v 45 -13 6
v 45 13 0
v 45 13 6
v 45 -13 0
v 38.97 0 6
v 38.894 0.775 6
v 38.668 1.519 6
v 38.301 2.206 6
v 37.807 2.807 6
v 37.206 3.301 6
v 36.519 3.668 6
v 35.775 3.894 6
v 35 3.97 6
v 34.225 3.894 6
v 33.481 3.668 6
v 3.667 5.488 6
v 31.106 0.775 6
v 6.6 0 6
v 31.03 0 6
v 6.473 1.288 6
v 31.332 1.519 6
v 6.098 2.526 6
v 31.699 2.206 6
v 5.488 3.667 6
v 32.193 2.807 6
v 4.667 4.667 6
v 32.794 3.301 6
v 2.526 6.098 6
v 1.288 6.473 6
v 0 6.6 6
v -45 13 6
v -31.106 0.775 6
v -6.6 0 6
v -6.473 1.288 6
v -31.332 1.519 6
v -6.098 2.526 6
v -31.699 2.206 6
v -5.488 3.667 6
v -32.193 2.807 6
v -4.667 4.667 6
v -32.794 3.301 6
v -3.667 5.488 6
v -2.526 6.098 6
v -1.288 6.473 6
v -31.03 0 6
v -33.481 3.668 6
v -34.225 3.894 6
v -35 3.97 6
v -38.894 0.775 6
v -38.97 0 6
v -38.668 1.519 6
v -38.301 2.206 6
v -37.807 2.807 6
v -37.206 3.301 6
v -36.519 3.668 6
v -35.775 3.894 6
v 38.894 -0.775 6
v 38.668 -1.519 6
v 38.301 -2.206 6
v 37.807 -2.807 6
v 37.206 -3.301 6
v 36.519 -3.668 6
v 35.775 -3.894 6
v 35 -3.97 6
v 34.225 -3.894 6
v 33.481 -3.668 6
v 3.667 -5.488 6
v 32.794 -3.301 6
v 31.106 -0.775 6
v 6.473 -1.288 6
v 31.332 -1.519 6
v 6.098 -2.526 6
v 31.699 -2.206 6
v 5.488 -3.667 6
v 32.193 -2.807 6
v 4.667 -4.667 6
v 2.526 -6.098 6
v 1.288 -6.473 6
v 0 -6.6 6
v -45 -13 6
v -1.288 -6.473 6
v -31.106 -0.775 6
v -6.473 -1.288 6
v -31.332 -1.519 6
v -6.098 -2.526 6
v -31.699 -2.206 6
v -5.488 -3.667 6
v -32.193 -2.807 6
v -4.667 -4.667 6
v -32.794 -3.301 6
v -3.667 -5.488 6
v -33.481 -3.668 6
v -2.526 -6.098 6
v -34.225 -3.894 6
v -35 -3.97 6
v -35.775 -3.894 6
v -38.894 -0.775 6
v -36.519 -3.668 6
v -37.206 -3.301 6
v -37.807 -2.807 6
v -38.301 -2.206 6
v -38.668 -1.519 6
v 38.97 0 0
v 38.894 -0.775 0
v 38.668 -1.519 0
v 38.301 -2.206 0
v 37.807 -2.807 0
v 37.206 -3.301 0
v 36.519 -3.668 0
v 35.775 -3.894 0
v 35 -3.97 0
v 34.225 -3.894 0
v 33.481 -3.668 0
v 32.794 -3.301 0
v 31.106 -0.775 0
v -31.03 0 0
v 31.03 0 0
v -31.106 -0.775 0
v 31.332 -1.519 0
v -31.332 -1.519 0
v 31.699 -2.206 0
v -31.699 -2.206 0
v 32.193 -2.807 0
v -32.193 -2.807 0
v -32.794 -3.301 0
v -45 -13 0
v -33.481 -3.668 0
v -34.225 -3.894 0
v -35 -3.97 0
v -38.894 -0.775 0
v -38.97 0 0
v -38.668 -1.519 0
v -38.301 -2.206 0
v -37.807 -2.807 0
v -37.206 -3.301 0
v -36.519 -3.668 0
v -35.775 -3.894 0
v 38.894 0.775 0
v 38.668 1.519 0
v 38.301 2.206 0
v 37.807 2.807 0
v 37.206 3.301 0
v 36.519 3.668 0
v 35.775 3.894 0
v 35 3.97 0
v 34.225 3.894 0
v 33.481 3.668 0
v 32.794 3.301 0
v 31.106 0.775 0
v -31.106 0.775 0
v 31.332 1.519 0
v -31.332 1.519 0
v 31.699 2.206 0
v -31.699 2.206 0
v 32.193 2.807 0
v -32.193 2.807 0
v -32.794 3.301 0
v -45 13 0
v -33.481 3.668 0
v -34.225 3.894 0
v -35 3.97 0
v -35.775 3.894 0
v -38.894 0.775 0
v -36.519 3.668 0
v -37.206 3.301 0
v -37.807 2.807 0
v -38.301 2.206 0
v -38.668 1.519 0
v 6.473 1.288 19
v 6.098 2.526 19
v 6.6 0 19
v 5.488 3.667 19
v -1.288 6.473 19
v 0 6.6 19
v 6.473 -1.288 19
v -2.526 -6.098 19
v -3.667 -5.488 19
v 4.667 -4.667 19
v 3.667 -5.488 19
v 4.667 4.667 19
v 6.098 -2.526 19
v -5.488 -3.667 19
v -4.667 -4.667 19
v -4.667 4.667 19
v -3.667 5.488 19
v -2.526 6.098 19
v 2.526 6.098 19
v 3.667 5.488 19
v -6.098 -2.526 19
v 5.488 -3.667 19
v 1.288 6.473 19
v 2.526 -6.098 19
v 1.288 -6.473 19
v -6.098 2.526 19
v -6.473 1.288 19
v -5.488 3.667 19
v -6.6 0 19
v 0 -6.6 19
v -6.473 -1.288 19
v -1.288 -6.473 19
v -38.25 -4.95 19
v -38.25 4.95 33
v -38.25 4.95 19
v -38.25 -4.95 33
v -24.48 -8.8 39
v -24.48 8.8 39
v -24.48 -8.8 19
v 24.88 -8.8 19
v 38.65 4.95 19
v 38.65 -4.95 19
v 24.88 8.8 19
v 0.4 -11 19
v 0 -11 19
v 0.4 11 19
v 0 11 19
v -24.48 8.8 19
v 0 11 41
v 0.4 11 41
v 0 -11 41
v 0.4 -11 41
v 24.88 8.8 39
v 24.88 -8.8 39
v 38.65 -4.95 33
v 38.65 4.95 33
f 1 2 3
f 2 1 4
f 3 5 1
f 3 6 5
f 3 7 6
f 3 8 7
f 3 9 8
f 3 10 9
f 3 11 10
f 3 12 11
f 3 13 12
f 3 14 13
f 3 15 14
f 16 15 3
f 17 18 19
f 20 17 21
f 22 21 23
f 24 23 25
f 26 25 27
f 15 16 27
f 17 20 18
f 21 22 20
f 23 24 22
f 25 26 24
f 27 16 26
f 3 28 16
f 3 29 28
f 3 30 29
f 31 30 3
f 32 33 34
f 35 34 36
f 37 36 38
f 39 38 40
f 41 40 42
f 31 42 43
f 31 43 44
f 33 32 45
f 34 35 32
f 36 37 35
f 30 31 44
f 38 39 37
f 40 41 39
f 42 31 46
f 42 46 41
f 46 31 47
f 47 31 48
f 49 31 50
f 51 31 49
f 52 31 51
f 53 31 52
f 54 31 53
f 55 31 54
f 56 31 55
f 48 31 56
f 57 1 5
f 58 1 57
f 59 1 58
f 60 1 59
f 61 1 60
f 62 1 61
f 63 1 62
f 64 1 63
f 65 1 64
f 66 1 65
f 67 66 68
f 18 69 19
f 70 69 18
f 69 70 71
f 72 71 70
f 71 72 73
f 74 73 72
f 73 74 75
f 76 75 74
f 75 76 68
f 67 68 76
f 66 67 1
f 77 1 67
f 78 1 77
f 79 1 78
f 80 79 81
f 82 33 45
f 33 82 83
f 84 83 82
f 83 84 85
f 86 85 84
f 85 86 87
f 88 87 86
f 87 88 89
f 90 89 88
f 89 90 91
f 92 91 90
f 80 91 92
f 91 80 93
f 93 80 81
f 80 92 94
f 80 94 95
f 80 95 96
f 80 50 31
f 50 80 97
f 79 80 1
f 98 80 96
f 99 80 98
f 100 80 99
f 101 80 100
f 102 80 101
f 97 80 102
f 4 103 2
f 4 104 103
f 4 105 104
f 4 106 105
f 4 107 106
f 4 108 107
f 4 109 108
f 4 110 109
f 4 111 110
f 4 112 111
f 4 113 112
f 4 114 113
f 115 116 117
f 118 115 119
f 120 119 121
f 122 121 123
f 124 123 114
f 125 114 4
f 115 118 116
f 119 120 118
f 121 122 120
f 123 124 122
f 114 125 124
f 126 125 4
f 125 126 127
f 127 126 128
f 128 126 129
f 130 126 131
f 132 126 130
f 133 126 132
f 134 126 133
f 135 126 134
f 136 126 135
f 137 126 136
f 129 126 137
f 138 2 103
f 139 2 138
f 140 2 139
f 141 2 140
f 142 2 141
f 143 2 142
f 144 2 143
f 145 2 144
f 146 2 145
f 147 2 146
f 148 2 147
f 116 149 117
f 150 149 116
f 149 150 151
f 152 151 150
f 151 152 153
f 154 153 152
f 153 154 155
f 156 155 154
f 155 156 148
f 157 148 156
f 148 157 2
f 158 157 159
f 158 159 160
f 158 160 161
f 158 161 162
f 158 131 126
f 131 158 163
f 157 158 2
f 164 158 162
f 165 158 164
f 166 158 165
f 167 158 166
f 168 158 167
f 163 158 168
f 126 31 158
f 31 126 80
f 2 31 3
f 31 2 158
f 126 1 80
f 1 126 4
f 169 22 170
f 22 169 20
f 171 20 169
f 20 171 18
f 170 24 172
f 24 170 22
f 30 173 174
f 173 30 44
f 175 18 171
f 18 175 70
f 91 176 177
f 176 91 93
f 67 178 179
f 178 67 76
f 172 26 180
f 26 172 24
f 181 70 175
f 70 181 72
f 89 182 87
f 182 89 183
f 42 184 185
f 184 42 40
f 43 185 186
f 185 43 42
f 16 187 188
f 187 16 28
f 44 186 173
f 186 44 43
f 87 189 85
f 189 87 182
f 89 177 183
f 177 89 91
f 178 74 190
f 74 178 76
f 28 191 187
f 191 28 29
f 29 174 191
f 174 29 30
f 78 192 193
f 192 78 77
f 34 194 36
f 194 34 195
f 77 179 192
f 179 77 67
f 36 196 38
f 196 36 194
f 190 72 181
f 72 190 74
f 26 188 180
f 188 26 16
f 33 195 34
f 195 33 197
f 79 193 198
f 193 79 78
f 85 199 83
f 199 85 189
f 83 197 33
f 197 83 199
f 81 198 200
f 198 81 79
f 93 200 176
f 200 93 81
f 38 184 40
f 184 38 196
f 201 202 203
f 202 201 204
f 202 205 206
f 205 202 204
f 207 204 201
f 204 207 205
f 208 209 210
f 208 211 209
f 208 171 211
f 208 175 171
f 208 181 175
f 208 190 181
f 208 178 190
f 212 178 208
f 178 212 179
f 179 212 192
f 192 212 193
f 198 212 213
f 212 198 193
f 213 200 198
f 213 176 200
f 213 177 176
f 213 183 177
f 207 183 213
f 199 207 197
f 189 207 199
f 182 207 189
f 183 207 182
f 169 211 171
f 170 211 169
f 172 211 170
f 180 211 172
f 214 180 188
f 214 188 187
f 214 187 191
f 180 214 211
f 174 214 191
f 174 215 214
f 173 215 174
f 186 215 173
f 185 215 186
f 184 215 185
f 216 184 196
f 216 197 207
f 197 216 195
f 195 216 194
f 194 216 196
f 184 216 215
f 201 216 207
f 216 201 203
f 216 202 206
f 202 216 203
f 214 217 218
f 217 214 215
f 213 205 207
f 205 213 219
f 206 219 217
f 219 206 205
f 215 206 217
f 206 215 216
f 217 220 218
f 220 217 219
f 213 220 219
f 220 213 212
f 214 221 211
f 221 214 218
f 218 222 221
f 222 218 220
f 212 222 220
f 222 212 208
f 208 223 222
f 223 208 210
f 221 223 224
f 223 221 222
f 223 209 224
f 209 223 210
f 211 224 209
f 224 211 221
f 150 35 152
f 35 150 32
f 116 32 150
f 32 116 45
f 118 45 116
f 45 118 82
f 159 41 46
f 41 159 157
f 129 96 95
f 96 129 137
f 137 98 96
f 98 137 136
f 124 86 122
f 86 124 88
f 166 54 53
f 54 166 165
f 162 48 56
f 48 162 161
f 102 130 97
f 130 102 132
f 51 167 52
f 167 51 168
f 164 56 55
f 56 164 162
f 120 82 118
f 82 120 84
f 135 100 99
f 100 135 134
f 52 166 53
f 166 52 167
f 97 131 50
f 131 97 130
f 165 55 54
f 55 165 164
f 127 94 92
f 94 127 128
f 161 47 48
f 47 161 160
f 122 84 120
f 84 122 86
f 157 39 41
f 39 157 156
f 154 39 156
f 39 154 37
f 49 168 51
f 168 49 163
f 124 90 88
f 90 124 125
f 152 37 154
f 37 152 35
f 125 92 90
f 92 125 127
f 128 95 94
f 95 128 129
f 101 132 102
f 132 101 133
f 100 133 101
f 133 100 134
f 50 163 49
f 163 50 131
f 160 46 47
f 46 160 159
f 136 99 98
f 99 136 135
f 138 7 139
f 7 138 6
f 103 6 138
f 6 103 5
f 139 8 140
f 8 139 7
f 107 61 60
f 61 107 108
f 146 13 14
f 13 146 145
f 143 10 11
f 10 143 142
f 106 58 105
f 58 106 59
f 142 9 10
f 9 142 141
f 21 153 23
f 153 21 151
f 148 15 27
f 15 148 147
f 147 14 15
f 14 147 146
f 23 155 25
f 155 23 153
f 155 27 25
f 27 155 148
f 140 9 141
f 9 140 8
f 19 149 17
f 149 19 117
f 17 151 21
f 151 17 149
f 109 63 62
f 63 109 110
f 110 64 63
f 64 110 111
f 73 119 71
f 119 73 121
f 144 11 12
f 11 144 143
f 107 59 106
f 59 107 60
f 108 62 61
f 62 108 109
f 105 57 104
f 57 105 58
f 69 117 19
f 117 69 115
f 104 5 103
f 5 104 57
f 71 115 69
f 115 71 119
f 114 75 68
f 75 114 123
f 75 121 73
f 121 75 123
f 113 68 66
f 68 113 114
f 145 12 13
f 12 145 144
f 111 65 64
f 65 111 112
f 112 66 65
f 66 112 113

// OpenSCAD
$fn = 32;

// ----------------------------------------------------------------------
// Boat cleat: 90 mm base, horn 30 mm up
// ----------------------------------------------------------------------

// --- parameters (mm) ---
base_l = 90;              // base length
base_w = 26;              // base width
base_t = 6;               // base thickness
horn_len = 76.5;          // horn length
horn_d = 22;              // horn diameter at the middle
horn_z = 30;              // horn axis height
end_drop = 8;             // how far the horn tips drop
post_d = 13.2;            // centre post diameter
holes_d = 7.94;           // fixing holes
hole_x = 35;              // fixing hole spacing

difference() {
  union() {
    translate([-45, -13, 0]) cube([base_l, base_w, base_t]);
    /* centre post, sunk 1 mm into the base */
    translate([0, 0, 5]) cylinder(h = 25, d = post_d);
    /* horn: a hull chain of boxes, full in the middle and lighter at the tips */
    hull() {
      translate([-38.25, -4.95, 19]) cube([0.4, 9.9, 14], center = false);
      translate([-24.48, -8.8, 19]) cube([0.4, 17.6, 20], center = false);
    }
    hull() {
      translate([-24.48, -8.8, 19]) cube([0.4, 17.6, 20], center = false);
      translate([0, -11, 19]) cube([0.4, 22, 22], center = false);
    }
    hull() {
      translate([0, -11, 19]) cube([0.4, 22, 22], center = false);
      translate([24.48, -8.8, 19]) cube([0.4, 17.6, 20], center = false);
    }
    hull() {
      translate([24.48, -8.8, 19]) cube([0.4, 17.6, 20], center = false);
      translate([38.25, -4.95, 19]) cube([0.4, 9.9, 14], center = false);
    }
  }
  translate([-35, 0, -2.5]) cylinder(h = base_t + 5, d = holes_d);
  translate([35, 0, -2.5]) cylinder(h = base_t + 5, d = holes_d);
}
